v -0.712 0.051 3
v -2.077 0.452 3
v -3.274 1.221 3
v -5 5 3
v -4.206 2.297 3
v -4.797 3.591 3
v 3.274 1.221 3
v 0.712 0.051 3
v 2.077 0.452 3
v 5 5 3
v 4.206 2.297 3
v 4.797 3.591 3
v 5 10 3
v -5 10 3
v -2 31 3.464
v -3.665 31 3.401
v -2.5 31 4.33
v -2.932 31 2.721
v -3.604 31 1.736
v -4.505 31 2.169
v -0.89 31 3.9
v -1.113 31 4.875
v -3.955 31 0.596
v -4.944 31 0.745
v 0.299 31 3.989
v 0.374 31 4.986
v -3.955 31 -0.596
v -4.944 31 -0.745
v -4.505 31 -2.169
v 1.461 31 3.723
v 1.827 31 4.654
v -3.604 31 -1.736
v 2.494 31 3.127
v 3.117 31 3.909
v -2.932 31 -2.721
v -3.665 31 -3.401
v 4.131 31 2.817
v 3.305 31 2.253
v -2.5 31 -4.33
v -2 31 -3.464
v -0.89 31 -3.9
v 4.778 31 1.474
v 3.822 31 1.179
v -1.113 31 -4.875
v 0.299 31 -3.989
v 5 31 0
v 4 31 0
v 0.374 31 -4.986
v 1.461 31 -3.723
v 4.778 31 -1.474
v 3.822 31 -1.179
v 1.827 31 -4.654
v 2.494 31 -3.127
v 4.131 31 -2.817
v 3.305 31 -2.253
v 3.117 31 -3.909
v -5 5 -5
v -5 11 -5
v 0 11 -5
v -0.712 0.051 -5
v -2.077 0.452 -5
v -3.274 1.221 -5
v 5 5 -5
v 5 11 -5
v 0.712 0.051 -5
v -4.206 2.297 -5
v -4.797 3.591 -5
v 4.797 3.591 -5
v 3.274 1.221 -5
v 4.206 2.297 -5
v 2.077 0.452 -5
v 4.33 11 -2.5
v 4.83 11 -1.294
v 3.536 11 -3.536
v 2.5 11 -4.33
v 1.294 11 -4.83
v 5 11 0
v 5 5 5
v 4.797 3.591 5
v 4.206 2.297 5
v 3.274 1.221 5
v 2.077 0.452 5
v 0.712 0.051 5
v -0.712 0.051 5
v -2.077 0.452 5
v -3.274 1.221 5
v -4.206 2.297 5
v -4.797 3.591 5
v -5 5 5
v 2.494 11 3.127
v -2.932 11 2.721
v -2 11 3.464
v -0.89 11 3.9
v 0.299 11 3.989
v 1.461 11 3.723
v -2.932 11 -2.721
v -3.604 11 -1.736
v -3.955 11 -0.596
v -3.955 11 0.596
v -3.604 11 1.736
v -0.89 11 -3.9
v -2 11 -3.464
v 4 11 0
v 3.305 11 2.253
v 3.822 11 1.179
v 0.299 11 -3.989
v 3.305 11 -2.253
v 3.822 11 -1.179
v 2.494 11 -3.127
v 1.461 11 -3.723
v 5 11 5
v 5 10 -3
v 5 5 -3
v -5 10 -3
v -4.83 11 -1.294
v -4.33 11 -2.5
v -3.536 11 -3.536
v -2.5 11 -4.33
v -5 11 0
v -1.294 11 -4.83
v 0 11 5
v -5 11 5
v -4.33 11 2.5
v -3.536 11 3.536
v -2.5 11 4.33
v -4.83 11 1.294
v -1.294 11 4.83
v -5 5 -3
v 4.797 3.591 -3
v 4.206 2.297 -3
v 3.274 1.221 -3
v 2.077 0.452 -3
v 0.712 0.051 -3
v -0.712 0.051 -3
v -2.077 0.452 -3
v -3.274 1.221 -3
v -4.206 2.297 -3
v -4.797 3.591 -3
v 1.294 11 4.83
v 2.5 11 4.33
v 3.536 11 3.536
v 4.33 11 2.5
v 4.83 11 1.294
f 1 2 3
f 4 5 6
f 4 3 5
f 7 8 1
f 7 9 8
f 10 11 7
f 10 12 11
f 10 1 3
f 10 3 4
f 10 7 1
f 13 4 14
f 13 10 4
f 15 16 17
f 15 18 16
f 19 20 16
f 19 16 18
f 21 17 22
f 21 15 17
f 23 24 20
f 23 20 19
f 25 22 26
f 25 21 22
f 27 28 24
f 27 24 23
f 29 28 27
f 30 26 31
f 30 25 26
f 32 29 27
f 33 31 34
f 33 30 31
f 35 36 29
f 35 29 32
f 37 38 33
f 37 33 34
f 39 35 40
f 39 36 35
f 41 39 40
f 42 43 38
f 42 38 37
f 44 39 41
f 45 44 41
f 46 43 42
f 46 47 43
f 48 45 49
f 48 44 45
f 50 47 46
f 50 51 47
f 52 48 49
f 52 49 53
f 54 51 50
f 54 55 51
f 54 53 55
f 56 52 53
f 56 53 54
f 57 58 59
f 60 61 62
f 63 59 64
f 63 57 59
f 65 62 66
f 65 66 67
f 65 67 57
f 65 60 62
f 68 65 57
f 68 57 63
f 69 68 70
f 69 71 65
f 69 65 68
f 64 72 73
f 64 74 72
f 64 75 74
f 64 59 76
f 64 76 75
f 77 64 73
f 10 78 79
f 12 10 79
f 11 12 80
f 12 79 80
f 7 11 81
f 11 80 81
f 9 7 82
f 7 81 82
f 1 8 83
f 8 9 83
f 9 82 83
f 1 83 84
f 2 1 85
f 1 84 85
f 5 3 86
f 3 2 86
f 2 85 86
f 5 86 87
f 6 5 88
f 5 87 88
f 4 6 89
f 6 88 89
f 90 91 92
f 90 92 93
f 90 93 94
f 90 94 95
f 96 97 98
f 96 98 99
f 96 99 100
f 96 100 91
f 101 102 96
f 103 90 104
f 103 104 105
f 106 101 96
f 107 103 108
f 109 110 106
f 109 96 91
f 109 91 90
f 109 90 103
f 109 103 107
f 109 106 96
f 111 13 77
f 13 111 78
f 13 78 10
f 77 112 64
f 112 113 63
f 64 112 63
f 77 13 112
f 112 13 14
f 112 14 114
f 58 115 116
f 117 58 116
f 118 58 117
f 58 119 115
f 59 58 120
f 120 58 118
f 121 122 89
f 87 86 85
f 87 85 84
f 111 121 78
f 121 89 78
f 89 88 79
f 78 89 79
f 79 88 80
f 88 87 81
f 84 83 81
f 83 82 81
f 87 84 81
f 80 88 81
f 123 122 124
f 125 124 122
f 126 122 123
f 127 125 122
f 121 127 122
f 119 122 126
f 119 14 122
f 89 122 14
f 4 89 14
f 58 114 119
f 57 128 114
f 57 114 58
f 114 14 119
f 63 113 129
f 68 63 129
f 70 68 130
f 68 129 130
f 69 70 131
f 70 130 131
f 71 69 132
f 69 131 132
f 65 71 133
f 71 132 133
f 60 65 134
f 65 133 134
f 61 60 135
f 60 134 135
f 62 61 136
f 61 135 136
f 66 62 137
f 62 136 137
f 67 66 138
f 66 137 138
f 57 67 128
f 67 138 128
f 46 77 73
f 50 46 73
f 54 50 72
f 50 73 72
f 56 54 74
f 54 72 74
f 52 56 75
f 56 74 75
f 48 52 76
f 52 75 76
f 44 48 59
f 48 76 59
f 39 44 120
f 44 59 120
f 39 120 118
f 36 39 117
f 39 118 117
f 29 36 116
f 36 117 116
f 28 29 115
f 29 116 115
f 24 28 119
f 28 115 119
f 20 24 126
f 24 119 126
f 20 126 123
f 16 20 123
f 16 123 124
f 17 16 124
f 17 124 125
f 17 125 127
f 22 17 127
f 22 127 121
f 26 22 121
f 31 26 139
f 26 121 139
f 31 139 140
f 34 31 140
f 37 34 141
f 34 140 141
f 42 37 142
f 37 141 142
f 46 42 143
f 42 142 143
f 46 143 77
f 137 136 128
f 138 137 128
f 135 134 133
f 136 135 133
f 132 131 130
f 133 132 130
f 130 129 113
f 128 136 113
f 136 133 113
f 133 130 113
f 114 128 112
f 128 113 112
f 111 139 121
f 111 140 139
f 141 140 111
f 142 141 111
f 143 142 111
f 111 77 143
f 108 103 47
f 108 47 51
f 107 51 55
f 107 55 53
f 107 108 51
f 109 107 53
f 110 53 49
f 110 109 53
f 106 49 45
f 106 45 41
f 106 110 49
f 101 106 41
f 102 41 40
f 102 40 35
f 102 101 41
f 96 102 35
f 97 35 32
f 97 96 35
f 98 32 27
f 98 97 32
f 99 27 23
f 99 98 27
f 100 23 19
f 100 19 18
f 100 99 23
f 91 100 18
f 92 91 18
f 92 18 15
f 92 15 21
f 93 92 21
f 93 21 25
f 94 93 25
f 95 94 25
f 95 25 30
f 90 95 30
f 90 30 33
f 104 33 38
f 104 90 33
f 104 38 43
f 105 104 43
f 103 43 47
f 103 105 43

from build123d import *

# Parameters (mm, degrees)
SKETCH_1_W          = 10
SKETCH_1_H          = 10
EXTRUDE_1_DEPTH     = 11
SKETCH_2_R          = 5
SKETCH_2_R_2        = 4
EXTRUDE_2_DEPTH     = 20
SKETCH_3_W          = 6
SKETCH_3_H          = 10
CUT_EXTRUDE_1_DEPTH = 60
CUT_EXTRUDE_2_DEPTH = 60


with BuildPart() as part:
    # 草图1 → 凸台-拉伸1 (new body)
    with BuildSketch(Plane(origin=(0, 0, 0), x_dir=(1, 0, 0), z_dir=(0, 1, 0))):
        Rectangle(SKETCH_1_W, SKETCH_1_H)
    extrude(amount=EXTRUDE_1_DEPTH)

    # 草图2 → 凸台-拉伸2 (add)
    with BuildSketch(Plane(origin=(0, 11, 0), x_dir=(1, 0, 0), z_dir=(0, 1, 0))):
        Circle(SKETCH_2_R)
        Circle(SKETCH_2_R_2, mode=Mode.SUBTRACT)
    extrude(amount=EXTRUDE_2_DEPTH)

    # 草图3 → 切除-拉伸1 (cut)
    with BuildSketch(Plane(origin=(5, 0, 0), x_dir=(0, 0, -1), z_dir=(1, 0, 0))):
        with Locations((0, 5)):
            Rectangle(SKETCH_3_W, SKETCH_3_H)
    extrude(amount=-CUT_EXTRUDE_1_DEPTH, mode=Mode.SUBTRACT)

    # 草图4 → 切除-拉伸2 (cut)
    with BuildSketch(Plane.XY.offset(5)):
        with BuildLine():
            Line((-5, 5), (-5, -1.760834605))
            Line((-5, -1.760834605), (5, -1.760834605))
            Line((5, -1.760834605), (5, 5))
            ThreePointArc((5, 5), (0, 0), (-5, 5))
        make_face()
    extrude(amount=-CUT_EXTRUDE_2_DEPTH, mode=Mode.SUBTRACT)


solid = part.part
